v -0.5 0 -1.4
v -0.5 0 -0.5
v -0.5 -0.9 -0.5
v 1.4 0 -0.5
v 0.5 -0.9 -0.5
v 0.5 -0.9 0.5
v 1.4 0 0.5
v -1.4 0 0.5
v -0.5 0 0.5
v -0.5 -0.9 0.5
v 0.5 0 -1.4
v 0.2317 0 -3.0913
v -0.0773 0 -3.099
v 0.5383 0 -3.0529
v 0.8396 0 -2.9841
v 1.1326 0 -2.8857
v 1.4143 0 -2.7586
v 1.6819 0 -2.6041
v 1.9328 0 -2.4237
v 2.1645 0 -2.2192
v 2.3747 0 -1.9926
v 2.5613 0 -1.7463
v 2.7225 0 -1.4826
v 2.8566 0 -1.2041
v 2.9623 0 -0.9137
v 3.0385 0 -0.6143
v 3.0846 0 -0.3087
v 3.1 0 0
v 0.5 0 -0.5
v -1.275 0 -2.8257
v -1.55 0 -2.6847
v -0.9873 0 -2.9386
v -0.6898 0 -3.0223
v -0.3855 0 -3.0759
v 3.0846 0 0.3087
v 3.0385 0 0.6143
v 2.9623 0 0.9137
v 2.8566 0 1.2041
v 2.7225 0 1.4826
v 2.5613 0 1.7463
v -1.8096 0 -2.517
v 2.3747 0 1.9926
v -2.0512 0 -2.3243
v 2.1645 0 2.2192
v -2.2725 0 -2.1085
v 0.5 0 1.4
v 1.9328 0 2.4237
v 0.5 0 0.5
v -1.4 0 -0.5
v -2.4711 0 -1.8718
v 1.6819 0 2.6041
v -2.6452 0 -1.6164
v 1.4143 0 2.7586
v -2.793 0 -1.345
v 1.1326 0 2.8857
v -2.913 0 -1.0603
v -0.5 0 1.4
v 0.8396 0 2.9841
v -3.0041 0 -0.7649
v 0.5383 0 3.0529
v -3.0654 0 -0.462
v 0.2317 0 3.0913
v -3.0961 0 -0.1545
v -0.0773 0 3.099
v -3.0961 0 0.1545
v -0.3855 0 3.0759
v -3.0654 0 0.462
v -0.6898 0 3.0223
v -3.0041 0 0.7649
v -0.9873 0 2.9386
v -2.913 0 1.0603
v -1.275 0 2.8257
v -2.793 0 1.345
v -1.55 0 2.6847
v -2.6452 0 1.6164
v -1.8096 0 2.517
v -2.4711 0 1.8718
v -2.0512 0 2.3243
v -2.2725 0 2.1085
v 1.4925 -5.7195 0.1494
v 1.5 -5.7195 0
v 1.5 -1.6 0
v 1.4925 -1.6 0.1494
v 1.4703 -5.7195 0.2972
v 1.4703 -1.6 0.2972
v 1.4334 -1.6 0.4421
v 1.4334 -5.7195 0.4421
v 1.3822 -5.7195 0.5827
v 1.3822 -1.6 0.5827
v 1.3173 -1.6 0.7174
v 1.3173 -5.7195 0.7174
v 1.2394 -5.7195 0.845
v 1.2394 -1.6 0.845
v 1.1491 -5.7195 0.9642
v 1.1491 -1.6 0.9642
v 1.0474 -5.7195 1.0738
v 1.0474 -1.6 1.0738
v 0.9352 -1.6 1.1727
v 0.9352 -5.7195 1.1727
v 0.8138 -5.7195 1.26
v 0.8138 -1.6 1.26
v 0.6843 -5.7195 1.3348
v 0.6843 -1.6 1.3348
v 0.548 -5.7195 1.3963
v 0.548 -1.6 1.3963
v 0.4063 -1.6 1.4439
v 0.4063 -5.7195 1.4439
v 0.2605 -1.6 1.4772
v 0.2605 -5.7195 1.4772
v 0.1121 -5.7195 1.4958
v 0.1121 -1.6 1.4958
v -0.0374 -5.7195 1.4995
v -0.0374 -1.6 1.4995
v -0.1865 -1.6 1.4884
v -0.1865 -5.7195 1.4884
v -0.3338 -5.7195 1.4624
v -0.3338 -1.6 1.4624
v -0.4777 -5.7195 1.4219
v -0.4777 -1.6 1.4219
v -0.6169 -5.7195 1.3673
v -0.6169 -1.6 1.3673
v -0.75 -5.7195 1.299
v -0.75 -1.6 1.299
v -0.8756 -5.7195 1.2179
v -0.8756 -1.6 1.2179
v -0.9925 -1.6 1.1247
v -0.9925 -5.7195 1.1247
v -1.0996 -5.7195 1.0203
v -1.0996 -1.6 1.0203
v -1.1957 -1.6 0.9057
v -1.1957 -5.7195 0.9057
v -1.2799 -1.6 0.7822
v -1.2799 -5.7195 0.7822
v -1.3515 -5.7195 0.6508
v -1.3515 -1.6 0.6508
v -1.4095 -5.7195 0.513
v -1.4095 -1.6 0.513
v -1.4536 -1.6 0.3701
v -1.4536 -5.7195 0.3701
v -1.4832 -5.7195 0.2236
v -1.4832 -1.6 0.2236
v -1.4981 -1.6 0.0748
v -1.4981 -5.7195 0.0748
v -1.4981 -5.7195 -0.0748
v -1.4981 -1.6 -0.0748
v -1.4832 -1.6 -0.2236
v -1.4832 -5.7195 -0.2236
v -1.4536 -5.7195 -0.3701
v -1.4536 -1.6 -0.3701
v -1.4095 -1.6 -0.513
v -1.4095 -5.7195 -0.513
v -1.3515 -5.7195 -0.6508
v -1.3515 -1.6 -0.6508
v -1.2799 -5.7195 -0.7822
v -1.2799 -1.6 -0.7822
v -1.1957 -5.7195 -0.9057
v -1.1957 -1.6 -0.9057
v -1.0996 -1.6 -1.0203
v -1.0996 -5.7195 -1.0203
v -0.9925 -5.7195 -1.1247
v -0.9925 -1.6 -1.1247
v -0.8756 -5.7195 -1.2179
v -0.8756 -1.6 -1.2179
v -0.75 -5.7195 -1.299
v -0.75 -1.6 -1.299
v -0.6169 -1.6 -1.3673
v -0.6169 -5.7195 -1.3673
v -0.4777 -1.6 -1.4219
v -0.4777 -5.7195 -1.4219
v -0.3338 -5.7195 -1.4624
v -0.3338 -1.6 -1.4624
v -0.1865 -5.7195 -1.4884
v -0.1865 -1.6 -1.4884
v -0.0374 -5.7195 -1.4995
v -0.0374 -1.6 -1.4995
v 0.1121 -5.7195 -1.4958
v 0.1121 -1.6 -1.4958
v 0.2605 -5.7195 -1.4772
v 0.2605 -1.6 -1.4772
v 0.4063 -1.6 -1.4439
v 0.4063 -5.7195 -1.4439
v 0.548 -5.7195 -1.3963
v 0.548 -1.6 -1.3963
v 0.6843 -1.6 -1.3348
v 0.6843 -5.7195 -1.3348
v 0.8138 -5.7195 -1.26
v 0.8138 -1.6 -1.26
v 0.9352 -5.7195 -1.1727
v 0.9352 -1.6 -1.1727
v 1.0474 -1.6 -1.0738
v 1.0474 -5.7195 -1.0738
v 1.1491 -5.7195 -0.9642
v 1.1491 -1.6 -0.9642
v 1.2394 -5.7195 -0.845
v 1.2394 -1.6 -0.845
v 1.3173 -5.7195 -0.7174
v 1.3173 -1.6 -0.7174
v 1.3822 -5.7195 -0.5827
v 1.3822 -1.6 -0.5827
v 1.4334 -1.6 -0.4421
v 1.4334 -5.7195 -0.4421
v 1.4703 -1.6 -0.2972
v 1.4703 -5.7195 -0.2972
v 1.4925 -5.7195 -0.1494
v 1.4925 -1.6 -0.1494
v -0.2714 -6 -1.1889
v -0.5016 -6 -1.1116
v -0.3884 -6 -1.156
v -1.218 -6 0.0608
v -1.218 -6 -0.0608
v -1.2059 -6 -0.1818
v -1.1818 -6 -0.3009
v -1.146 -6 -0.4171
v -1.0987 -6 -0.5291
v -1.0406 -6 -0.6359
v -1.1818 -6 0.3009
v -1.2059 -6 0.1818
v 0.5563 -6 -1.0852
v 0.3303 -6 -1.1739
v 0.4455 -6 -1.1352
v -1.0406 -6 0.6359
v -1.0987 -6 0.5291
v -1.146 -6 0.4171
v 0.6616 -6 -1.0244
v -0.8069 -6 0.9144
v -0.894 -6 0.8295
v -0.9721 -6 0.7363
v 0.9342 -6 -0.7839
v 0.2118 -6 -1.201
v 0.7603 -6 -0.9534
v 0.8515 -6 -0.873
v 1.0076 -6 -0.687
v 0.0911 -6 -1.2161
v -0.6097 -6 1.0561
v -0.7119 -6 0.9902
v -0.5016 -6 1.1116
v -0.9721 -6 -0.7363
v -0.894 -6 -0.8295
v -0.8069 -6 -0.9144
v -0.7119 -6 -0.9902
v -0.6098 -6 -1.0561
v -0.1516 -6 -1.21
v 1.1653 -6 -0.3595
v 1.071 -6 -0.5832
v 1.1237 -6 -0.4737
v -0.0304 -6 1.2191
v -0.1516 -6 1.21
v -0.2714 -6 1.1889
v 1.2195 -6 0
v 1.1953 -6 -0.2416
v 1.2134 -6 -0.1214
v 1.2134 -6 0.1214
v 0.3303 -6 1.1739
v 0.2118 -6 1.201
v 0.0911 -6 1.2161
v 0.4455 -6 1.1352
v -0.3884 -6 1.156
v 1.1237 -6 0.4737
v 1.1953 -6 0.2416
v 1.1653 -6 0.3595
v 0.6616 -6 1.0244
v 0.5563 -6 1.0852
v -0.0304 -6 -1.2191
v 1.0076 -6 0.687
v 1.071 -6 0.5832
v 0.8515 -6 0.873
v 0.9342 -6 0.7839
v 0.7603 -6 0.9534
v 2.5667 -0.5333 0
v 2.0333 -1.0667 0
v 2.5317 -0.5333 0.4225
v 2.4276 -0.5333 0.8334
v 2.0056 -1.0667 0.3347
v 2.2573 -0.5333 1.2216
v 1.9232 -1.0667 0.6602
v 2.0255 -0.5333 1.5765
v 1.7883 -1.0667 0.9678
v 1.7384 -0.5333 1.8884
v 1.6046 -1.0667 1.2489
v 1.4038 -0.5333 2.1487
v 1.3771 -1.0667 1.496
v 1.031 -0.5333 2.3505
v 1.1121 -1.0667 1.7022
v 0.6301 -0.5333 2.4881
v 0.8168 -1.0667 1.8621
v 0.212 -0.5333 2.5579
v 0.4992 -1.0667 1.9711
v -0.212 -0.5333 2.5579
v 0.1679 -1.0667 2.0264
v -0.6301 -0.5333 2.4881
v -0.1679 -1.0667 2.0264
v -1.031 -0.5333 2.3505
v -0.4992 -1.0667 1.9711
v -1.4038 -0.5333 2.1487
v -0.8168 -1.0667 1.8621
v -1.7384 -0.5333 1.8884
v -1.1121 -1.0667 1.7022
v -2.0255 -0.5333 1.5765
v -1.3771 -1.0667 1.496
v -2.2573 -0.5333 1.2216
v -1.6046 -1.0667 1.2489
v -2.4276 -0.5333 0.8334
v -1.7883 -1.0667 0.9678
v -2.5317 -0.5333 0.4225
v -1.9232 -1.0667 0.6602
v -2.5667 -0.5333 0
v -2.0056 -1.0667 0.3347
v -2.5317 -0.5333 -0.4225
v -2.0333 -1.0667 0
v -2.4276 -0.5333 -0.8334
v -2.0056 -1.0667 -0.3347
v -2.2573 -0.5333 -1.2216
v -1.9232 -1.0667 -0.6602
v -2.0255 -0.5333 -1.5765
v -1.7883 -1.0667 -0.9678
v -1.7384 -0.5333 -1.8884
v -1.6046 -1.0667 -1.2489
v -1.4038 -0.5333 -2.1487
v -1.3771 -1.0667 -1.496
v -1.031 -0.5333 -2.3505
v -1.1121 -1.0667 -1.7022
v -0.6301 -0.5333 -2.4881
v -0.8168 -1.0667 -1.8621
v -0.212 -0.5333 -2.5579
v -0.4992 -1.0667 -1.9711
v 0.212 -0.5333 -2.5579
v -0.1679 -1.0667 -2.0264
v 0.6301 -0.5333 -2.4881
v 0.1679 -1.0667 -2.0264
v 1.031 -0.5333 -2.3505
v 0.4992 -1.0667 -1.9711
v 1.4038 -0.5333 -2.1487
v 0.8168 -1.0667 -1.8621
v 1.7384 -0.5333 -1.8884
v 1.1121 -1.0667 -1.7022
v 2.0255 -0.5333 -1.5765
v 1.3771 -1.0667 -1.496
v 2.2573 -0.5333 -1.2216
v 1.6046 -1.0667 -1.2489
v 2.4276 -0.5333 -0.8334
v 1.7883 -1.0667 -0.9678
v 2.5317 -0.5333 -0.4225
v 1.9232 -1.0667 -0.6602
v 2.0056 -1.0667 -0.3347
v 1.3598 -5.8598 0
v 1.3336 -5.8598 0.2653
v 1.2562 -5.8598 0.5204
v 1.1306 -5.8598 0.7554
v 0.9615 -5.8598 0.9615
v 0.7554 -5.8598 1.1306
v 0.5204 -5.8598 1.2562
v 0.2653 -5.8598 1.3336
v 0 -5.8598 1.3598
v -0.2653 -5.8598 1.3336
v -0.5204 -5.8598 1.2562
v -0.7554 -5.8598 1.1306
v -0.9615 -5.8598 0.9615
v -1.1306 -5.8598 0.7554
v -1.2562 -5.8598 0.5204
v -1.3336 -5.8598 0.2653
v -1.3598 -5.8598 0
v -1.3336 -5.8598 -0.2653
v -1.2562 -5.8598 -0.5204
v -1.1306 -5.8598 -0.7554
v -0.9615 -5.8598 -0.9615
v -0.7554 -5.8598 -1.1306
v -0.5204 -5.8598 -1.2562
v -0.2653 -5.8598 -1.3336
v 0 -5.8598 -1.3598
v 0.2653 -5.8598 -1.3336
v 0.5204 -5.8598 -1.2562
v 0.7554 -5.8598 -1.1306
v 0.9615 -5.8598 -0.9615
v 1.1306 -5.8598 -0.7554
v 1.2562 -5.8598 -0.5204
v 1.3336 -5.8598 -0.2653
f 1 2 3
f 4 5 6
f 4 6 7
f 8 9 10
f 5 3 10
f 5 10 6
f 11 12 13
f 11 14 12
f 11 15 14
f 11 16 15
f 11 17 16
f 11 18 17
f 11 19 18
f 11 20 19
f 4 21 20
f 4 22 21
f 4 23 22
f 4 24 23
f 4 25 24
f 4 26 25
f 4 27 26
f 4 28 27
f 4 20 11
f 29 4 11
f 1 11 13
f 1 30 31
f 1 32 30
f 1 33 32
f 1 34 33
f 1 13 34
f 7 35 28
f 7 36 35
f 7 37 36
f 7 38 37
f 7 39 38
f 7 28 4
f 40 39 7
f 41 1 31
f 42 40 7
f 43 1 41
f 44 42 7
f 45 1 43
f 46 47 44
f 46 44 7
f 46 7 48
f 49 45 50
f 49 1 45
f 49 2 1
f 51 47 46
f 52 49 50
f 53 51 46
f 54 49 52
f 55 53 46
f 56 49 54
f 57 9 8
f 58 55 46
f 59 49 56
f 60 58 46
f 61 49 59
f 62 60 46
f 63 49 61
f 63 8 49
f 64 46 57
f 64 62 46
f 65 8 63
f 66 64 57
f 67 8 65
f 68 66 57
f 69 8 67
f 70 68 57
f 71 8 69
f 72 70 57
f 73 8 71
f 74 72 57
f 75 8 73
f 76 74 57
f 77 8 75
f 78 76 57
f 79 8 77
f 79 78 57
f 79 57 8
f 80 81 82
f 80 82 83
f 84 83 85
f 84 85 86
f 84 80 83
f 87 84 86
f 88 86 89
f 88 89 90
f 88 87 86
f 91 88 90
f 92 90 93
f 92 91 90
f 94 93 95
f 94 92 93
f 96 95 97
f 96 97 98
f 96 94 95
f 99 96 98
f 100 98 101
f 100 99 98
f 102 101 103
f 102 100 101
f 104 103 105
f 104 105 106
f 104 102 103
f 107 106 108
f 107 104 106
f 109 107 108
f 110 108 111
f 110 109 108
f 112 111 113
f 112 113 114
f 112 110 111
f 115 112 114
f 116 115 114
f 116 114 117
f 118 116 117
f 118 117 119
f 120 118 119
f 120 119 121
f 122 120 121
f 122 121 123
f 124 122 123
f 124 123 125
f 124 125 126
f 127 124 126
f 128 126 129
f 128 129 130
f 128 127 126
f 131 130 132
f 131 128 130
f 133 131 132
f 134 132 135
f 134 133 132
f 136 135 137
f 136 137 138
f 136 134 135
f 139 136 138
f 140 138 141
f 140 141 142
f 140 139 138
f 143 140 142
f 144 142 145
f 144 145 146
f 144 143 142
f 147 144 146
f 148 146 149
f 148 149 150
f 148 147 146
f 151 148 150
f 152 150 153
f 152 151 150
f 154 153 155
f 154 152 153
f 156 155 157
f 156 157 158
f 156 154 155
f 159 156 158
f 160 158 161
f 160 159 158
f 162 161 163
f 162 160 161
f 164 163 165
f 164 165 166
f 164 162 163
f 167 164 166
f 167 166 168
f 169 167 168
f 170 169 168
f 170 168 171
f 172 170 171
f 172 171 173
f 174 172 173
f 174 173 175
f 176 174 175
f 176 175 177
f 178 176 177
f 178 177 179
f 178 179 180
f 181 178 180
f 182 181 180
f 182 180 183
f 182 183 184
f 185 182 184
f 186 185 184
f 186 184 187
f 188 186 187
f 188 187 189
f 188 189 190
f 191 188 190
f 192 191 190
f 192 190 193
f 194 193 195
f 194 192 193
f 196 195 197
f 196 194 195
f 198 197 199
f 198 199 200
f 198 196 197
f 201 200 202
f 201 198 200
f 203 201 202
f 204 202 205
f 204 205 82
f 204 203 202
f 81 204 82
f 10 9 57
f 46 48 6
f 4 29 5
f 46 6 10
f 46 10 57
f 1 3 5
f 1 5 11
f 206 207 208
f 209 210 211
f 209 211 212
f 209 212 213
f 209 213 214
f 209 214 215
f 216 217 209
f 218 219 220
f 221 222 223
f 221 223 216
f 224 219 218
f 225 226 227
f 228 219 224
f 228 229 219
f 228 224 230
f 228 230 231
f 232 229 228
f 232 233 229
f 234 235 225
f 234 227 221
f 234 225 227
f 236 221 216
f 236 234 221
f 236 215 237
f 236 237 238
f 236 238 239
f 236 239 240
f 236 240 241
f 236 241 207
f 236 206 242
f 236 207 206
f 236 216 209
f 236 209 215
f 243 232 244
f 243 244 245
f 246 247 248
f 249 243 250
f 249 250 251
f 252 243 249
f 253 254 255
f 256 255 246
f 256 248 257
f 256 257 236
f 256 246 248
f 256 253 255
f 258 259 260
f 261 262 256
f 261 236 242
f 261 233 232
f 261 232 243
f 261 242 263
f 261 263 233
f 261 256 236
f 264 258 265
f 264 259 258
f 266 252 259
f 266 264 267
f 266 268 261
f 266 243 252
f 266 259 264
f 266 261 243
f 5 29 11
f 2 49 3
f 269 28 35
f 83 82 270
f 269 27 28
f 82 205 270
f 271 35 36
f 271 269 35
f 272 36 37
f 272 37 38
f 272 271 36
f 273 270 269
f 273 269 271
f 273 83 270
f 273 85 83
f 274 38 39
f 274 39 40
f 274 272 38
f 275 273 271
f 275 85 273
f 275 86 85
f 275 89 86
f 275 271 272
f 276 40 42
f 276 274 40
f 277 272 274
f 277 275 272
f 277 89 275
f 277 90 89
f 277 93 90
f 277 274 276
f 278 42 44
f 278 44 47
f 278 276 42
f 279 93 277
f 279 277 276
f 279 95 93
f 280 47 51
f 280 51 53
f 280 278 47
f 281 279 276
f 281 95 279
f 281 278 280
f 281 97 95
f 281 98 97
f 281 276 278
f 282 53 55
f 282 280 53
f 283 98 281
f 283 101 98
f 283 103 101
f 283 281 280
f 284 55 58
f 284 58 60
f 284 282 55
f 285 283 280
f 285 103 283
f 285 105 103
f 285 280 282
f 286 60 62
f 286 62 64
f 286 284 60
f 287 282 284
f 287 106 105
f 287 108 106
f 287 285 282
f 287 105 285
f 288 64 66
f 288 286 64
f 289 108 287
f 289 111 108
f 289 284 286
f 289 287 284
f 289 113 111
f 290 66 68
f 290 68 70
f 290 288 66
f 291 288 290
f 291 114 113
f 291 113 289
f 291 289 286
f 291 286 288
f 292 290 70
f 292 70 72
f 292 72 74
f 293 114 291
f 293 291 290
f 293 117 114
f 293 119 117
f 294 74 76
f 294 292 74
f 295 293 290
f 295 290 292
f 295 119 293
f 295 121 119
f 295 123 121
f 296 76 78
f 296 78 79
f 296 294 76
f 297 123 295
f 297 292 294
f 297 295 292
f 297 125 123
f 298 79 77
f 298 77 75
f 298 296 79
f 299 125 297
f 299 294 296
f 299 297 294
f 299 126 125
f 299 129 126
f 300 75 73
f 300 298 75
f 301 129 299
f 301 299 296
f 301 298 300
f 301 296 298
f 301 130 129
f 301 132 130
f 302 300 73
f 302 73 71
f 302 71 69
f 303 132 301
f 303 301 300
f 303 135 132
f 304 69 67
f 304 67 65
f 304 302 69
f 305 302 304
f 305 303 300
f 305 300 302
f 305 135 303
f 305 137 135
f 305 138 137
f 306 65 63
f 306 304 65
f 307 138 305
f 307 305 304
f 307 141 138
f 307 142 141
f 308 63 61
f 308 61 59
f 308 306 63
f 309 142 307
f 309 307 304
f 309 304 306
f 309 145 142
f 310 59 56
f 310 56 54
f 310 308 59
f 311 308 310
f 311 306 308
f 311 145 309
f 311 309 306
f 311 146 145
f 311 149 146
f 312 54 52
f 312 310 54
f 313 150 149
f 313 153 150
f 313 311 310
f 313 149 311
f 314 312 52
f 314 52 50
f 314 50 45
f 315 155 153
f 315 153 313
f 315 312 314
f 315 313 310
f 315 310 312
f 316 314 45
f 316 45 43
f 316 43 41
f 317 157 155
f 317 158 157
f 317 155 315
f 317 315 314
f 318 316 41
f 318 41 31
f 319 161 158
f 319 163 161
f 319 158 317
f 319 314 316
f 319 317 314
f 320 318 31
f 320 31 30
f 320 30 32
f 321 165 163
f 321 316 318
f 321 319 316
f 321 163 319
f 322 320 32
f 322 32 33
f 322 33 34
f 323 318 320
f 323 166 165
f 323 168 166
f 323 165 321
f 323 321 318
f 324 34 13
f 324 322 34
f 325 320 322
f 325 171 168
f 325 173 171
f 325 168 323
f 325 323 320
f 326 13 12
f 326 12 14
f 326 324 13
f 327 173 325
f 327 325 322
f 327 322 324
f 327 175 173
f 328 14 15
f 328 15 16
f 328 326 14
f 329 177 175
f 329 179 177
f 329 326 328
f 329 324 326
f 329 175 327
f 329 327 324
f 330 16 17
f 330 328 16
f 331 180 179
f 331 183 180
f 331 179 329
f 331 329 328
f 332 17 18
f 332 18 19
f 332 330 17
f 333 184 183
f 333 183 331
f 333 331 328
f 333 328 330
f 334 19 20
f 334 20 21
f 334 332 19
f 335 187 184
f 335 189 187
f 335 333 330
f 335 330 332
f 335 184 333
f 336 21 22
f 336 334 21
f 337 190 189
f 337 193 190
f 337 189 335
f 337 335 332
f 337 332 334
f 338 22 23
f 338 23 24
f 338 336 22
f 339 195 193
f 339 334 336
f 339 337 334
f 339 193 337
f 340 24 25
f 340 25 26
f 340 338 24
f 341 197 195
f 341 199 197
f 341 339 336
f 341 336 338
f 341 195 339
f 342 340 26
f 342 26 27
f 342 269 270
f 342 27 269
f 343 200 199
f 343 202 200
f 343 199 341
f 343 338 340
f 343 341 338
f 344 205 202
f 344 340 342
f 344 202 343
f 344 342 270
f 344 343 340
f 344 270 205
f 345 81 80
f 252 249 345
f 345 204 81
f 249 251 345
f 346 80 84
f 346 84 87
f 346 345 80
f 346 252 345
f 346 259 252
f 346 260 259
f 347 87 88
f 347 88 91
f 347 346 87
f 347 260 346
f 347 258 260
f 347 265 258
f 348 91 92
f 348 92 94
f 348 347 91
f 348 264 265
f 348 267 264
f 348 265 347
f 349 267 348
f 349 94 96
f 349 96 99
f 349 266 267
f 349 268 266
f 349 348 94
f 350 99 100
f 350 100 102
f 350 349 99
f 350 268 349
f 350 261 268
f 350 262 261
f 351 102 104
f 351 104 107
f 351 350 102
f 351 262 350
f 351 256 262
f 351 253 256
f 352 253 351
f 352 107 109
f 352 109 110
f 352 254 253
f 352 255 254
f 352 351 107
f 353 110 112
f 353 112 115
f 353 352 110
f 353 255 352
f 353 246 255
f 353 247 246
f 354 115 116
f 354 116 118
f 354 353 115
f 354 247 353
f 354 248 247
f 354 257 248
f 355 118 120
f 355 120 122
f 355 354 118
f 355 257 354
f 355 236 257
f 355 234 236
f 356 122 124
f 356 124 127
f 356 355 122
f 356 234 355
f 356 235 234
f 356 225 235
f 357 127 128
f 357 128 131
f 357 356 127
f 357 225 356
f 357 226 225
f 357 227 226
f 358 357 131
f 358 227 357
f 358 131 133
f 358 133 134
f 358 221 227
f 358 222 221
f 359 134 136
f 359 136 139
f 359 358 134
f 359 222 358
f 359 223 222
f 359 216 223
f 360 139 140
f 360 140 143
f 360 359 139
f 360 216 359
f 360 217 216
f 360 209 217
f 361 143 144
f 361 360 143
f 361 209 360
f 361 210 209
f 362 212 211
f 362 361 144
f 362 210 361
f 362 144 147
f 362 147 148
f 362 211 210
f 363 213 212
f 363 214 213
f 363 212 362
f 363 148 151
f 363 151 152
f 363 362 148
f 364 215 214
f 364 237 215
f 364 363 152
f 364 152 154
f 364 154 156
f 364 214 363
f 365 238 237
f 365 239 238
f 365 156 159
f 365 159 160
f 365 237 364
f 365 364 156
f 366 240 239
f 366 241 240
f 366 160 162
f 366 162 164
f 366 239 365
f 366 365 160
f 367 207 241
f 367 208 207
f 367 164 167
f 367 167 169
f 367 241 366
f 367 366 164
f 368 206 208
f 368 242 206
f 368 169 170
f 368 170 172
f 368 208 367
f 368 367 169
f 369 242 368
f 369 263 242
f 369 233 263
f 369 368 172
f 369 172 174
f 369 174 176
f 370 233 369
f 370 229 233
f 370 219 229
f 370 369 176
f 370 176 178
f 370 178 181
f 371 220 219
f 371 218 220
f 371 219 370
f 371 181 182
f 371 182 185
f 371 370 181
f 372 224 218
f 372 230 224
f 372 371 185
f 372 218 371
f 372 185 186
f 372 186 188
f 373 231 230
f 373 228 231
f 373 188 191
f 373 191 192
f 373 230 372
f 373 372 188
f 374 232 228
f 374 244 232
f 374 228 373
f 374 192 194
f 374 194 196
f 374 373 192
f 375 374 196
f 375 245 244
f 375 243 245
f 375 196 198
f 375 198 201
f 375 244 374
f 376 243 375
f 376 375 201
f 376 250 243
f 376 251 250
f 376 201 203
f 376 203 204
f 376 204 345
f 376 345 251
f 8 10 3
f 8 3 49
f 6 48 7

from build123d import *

# Parameters (mm, degrees)
CHAMFER_1_SIZE           = 0.2805
CUT_EXTRUDE_1_DEPTH      = 0.5
PATTERN_CIRCULAR_1_COUNT = 4
SKETCH_3_W               = 1
SKETCH_3_H               = 1
EXTRUDE_1_DEPTH          = 2


with BuildPart() as part:
    # Sketch 1 → Revolve 1 (revolve)
    with BuildSketch(Plane.XY):
        Polygon((0, 0), (3.1, 0), (1.5, -1.6), (1.5, -6), (0, -6), align=None)
    revolve(axis=Axis((0, 0, 0), (0, -1, 0)))

    # Chamfer 1
    chamfer_1_edges = [part.edges().sort_by_distance(p)[0] for p in [
        (-1.5, -6, 0),
    ]]
    chamfer(chamfer_1_edges, length=CHAMFER_1_SIZE)

    # Sketch 2 → Cut-Extrude 1 (cut, symmetric)
    with BuildSketch(Plane.XY):
        Polygon((0, 0), (0, -1.4), (-1.4, 0), align=None)
    cut_extrude_1 = extrude(amount=CUT_EXTRUDE_1_DEPTH, both=True, mode=Mode.SUBTRACT)

    # Pattern Circular 1: Cut-Extrude 1 ×4 about axis
    pattern_circular_1_axis = Axis((0, 0, 0), (0, 1, 0))
    for i in range(1, PATTERN_CIRCULAR_1_COUNT):
        add(cut_extrude_1.rotate(pattern_circular_1_axis, i * 360 / PATTERN_CIRCULAR_1_COUNT), mode=Mode.SUBTRACT)

    # Sketch 3 → Extrude 1 (add)
    with BuildSketch(Plane(origin=(0, -0.9, 0), x_dir=(1, 0, 0), z_dir=(0, 1, 0))):
        Rectangle(SKETCH_3_W, SKETCH_3_H)
    extrude(amount=-EXTRUDE_1_DEPTH)


solid = part.part
